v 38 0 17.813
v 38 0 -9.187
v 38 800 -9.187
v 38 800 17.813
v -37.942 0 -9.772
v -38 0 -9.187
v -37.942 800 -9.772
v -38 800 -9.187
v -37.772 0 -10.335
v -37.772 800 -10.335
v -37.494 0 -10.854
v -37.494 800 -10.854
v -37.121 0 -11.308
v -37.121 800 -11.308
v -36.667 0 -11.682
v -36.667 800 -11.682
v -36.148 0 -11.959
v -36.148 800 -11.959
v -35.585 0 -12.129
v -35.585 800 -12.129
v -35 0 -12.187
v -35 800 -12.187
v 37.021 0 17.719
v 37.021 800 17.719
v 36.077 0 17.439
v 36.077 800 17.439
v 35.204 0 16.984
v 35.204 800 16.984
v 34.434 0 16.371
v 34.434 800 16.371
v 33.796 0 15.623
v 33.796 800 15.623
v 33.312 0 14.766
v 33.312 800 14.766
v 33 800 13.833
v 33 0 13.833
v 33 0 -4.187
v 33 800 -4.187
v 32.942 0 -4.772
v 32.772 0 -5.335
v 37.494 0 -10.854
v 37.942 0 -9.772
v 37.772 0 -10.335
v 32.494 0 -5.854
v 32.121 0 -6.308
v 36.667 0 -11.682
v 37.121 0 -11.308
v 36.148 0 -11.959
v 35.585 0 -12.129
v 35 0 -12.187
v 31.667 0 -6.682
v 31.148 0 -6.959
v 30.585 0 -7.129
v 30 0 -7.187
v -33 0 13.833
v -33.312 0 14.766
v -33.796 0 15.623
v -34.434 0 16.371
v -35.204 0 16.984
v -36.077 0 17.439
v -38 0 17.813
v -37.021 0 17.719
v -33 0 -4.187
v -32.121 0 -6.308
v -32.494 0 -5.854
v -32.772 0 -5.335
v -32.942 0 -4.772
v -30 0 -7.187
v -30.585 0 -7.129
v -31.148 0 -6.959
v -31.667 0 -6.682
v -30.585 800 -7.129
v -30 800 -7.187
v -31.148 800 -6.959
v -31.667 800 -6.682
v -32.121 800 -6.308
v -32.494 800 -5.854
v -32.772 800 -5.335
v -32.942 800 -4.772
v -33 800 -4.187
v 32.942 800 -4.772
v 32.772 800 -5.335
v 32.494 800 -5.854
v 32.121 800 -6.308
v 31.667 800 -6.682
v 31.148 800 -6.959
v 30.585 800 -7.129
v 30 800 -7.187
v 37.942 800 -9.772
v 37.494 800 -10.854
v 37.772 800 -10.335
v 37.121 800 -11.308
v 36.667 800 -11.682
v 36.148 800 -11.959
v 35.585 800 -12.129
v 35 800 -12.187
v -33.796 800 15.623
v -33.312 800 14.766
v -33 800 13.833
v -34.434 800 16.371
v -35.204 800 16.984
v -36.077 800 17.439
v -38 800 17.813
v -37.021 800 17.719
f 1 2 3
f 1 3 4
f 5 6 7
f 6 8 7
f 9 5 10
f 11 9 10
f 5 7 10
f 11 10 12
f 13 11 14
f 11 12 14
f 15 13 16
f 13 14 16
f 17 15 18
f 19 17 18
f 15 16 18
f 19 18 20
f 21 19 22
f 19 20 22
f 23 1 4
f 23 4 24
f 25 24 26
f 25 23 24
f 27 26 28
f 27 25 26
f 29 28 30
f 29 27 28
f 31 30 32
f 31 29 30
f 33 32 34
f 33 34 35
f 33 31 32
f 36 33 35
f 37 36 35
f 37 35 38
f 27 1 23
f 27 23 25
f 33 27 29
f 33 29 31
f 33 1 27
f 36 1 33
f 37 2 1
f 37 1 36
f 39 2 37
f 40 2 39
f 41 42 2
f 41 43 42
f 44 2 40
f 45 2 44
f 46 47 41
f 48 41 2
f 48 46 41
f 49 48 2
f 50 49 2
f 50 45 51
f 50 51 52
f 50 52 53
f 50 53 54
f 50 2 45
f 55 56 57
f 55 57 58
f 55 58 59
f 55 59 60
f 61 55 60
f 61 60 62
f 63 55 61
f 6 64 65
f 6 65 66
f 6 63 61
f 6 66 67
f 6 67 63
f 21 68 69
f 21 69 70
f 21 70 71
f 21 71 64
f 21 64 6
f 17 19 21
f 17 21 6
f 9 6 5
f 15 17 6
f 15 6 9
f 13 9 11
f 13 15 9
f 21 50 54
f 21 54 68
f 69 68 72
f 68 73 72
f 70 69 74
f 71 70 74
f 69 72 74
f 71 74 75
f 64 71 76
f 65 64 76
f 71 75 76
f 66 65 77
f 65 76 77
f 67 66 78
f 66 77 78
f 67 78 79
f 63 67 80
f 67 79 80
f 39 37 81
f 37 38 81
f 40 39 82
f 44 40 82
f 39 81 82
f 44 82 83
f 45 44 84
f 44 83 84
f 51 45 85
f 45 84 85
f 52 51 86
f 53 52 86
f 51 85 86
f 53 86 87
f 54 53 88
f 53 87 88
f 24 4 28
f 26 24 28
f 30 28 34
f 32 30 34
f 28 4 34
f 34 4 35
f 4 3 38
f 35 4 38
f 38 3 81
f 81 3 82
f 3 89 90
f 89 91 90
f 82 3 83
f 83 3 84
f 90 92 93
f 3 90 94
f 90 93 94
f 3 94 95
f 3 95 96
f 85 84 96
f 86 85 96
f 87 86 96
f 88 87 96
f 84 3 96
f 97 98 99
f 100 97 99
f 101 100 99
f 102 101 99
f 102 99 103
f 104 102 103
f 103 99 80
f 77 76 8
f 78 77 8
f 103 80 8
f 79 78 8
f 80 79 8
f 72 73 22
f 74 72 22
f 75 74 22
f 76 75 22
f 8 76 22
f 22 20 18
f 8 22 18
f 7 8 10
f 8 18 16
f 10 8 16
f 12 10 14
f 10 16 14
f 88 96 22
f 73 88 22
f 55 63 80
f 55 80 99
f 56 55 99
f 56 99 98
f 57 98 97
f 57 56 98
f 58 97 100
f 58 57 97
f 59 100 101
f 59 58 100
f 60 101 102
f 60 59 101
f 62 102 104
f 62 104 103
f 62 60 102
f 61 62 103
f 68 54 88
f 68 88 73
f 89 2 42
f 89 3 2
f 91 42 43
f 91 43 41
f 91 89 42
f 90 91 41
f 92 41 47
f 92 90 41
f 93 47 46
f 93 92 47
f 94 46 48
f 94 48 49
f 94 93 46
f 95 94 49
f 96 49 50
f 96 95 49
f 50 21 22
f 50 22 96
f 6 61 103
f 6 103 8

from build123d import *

# Parameters (mm, degrees)
BOSS_EXTRUDE1_DEPTH = 800
FILLET1_R           = 3


with BuildPart() as part:
    # Sketch2 → Boss-Extrude1 (new body)
    with BuildSketch(Plane(origin=(0, 0, 0), x_dir=(1, 0, 0), z_dir=(0, 1, 0))):
        with BuildLine():
            Line((38, 12.187104498), (38, -17.812895502))
            ThreePointArc((38, -17.812895502), (34.80462792, -16.696369068), (33, -13.832743381))
            Line((33, -13.832743381), (33, 7.187104498))
            Line((33, 7.187104498), (-33, 7.187104498))
            Line((-33, 7.187104498), (-33, -13.832743381))
            ThreePointArc((-33, -13.832743381), (-34.80462792, -16.696369068), (-38, -17.812895502))
            Line((-38, -17.812895502), (-38, 12.187104498))
            Line((-38, 12.187104498), (38, 12.187104498))
        make_face()
    extrude(amount=BOSS_EXTRUDE1_DEPTH)

    # Fillet1
    fillet1_edges = [part.edges().sort_by_distance(p)[0] for p in [
        (38, 400, -12.187104498),
        (33, 400, -7.187104498),
        (-33, 400, -7.187104498),
        (-38, 400, -12.187104498),
    ]]
    fillet(fillet1_edges, radius=FILLET1_R)


solid = part.part
